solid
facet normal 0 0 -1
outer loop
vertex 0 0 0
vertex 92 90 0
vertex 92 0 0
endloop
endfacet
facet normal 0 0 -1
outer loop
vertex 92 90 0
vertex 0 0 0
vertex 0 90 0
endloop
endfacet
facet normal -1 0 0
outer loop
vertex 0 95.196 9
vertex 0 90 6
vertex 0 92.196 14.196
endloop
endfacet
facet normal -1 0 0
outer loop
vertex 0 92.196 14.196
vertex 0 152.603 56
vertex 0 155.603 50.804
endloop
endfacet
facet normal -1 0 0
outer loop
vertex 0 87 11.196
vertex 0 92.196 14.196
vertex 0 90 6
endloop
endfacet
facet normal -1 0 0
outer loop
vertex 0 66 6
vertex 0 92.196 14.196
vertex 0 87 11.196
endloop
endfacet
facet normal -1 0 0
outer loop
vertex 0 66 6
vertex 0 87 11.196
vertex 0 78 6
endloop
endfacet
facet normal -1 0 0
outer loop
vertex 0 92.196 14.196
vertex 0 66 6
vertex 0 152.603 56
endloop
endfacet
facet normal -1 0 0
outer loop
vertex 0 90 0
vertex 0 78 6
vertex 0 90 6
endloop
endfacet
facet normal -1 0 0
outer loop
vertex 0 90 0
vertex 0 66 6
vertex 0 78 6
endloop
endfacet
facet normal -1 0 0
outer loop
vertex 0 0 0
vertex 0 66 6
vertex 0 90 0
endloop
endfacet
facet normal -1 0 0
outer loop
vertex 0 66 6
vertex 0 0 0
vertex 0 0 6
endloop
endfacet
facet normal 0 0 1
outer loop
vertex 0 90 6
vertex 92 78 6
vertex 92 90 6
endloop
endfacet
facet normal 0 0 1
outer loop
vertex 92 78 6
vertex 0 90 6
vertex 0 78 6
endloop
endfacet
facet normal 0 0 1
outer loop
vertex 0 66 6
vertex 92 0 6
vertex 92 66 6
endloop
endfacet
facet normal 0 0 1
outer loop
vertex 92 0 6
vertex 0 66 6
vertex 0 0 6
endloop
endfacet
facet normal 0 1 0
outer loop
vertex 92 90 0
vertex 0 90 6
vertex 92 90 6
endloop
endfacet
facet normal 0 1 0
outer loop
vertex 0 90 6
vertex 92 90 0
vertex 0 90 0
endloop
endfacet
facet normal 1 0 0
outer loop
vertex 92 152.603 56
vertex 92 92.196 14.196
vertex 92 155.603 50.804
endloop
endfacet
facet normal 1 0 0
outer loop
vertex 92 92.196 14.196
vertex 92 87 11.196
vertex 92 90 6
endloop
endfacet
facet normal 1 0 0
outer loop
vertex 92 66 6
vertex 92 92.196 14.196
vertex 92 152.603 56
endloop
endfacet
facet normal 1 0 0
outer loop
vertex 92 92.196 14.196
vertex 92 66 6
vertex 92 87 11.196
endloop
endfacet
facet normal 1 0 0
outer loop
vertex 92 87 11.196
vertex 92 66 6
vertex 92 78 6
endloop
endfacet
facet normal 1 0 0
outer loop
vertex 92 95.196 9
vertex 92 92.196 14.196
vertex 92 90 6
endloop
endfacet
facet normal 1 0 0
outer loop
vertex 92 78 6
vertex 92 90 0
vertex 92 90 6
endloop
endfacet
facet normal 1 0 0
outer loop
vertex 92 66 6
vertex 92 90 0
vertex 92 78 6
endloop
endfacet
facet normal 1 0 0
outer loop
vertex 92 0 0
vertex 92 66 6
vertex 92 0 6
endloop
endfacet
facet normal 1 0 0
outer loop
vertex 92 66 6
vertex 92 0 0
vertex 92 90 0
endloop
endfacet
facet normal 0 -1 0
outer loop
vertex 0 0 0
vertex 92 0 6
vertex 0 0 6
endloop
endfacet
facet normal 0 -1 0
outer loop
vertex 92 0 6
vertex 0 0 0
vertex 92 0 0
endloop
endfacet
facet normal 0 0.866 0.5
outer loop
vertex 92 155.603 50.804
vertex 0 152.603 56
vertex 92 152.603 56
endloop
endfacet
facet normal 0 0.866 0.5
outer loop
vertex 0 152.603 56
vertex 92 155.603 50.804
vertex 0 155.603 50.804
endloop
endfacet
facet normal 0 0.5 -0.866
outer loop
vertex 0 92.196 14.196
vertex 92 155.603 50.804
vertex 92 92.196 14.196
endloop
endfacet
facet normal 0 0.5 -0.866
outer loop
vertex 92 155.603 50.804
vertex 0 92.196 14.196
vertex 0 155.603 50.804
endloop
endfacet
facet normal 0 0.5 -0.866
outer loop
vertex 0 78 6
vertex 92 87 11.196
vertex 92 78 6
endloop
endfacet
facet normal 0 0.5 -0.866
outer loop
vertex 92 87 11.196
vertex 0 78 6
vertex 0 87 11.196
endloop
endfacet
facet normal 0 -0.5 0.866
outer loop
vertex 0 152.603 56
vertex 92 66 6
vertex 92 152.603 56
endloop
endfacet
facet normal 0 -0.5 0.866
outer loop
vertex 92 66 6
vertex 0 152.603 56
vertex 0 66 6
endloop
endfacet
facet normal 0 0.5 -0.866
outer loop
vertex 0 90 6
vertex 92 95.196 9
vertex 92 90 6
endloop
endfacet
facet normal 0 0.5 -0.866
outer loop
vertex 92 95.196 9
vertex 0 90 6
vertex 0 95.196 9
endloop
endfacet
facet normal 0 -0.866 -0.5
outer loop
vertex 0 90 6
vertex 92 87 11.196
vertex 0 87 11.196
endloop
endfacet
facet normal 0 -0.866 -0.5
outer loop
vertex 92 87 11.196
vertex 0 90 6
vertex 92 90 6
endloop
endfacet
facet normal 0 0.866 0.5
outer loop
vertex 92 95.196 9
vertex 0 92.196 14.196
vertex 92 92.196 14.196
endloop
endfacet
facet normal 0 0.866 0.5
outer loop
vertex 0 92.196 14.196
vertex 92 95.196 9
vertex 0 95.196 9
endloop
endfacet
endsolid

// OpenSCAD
/* [Fit] */
// Thickness of the phone + case (mm)
phone_thickness = 12; // [6:25]
// Width of the slot (mm)
slot_width = 80; // [50:120]

/* [Shape] */
// Viewing angle (degrees from vertical)
angle = 60; // [40:80]
// Base depth (mm)
base_depth = 90; // [60:140]
// Overall height (mm)
stand_height = 100; // [60:150]
// Material thickness (mm)
wall = 6; // [3:1:12]

/* [Hidden] */
$fn = 32;
slot_depth = phone_thickness + wall * 2;

module base() {
    linear_extrude(height = wall)
        square([slot_width + wall * 2, base_depth]);
}

module back_support() {
    rotate([90 - angle, 0, 0])
        translate([0, 0, -wall])
            linear_extrude(height = wall)
                square([slot_width + wall * 2, stand_height]);
}

module lip() {
    translate([0, slot_depth, 0])
        rotate([90 - angle, 0, 0])
            cube([slot_width + wall * 2, wall, wall * 2]);
}

base();
translate([0, base_depth - slot_depth, wall])
    back_support();
translate([0, base_depth - slot_depth, wall])
    lip();
